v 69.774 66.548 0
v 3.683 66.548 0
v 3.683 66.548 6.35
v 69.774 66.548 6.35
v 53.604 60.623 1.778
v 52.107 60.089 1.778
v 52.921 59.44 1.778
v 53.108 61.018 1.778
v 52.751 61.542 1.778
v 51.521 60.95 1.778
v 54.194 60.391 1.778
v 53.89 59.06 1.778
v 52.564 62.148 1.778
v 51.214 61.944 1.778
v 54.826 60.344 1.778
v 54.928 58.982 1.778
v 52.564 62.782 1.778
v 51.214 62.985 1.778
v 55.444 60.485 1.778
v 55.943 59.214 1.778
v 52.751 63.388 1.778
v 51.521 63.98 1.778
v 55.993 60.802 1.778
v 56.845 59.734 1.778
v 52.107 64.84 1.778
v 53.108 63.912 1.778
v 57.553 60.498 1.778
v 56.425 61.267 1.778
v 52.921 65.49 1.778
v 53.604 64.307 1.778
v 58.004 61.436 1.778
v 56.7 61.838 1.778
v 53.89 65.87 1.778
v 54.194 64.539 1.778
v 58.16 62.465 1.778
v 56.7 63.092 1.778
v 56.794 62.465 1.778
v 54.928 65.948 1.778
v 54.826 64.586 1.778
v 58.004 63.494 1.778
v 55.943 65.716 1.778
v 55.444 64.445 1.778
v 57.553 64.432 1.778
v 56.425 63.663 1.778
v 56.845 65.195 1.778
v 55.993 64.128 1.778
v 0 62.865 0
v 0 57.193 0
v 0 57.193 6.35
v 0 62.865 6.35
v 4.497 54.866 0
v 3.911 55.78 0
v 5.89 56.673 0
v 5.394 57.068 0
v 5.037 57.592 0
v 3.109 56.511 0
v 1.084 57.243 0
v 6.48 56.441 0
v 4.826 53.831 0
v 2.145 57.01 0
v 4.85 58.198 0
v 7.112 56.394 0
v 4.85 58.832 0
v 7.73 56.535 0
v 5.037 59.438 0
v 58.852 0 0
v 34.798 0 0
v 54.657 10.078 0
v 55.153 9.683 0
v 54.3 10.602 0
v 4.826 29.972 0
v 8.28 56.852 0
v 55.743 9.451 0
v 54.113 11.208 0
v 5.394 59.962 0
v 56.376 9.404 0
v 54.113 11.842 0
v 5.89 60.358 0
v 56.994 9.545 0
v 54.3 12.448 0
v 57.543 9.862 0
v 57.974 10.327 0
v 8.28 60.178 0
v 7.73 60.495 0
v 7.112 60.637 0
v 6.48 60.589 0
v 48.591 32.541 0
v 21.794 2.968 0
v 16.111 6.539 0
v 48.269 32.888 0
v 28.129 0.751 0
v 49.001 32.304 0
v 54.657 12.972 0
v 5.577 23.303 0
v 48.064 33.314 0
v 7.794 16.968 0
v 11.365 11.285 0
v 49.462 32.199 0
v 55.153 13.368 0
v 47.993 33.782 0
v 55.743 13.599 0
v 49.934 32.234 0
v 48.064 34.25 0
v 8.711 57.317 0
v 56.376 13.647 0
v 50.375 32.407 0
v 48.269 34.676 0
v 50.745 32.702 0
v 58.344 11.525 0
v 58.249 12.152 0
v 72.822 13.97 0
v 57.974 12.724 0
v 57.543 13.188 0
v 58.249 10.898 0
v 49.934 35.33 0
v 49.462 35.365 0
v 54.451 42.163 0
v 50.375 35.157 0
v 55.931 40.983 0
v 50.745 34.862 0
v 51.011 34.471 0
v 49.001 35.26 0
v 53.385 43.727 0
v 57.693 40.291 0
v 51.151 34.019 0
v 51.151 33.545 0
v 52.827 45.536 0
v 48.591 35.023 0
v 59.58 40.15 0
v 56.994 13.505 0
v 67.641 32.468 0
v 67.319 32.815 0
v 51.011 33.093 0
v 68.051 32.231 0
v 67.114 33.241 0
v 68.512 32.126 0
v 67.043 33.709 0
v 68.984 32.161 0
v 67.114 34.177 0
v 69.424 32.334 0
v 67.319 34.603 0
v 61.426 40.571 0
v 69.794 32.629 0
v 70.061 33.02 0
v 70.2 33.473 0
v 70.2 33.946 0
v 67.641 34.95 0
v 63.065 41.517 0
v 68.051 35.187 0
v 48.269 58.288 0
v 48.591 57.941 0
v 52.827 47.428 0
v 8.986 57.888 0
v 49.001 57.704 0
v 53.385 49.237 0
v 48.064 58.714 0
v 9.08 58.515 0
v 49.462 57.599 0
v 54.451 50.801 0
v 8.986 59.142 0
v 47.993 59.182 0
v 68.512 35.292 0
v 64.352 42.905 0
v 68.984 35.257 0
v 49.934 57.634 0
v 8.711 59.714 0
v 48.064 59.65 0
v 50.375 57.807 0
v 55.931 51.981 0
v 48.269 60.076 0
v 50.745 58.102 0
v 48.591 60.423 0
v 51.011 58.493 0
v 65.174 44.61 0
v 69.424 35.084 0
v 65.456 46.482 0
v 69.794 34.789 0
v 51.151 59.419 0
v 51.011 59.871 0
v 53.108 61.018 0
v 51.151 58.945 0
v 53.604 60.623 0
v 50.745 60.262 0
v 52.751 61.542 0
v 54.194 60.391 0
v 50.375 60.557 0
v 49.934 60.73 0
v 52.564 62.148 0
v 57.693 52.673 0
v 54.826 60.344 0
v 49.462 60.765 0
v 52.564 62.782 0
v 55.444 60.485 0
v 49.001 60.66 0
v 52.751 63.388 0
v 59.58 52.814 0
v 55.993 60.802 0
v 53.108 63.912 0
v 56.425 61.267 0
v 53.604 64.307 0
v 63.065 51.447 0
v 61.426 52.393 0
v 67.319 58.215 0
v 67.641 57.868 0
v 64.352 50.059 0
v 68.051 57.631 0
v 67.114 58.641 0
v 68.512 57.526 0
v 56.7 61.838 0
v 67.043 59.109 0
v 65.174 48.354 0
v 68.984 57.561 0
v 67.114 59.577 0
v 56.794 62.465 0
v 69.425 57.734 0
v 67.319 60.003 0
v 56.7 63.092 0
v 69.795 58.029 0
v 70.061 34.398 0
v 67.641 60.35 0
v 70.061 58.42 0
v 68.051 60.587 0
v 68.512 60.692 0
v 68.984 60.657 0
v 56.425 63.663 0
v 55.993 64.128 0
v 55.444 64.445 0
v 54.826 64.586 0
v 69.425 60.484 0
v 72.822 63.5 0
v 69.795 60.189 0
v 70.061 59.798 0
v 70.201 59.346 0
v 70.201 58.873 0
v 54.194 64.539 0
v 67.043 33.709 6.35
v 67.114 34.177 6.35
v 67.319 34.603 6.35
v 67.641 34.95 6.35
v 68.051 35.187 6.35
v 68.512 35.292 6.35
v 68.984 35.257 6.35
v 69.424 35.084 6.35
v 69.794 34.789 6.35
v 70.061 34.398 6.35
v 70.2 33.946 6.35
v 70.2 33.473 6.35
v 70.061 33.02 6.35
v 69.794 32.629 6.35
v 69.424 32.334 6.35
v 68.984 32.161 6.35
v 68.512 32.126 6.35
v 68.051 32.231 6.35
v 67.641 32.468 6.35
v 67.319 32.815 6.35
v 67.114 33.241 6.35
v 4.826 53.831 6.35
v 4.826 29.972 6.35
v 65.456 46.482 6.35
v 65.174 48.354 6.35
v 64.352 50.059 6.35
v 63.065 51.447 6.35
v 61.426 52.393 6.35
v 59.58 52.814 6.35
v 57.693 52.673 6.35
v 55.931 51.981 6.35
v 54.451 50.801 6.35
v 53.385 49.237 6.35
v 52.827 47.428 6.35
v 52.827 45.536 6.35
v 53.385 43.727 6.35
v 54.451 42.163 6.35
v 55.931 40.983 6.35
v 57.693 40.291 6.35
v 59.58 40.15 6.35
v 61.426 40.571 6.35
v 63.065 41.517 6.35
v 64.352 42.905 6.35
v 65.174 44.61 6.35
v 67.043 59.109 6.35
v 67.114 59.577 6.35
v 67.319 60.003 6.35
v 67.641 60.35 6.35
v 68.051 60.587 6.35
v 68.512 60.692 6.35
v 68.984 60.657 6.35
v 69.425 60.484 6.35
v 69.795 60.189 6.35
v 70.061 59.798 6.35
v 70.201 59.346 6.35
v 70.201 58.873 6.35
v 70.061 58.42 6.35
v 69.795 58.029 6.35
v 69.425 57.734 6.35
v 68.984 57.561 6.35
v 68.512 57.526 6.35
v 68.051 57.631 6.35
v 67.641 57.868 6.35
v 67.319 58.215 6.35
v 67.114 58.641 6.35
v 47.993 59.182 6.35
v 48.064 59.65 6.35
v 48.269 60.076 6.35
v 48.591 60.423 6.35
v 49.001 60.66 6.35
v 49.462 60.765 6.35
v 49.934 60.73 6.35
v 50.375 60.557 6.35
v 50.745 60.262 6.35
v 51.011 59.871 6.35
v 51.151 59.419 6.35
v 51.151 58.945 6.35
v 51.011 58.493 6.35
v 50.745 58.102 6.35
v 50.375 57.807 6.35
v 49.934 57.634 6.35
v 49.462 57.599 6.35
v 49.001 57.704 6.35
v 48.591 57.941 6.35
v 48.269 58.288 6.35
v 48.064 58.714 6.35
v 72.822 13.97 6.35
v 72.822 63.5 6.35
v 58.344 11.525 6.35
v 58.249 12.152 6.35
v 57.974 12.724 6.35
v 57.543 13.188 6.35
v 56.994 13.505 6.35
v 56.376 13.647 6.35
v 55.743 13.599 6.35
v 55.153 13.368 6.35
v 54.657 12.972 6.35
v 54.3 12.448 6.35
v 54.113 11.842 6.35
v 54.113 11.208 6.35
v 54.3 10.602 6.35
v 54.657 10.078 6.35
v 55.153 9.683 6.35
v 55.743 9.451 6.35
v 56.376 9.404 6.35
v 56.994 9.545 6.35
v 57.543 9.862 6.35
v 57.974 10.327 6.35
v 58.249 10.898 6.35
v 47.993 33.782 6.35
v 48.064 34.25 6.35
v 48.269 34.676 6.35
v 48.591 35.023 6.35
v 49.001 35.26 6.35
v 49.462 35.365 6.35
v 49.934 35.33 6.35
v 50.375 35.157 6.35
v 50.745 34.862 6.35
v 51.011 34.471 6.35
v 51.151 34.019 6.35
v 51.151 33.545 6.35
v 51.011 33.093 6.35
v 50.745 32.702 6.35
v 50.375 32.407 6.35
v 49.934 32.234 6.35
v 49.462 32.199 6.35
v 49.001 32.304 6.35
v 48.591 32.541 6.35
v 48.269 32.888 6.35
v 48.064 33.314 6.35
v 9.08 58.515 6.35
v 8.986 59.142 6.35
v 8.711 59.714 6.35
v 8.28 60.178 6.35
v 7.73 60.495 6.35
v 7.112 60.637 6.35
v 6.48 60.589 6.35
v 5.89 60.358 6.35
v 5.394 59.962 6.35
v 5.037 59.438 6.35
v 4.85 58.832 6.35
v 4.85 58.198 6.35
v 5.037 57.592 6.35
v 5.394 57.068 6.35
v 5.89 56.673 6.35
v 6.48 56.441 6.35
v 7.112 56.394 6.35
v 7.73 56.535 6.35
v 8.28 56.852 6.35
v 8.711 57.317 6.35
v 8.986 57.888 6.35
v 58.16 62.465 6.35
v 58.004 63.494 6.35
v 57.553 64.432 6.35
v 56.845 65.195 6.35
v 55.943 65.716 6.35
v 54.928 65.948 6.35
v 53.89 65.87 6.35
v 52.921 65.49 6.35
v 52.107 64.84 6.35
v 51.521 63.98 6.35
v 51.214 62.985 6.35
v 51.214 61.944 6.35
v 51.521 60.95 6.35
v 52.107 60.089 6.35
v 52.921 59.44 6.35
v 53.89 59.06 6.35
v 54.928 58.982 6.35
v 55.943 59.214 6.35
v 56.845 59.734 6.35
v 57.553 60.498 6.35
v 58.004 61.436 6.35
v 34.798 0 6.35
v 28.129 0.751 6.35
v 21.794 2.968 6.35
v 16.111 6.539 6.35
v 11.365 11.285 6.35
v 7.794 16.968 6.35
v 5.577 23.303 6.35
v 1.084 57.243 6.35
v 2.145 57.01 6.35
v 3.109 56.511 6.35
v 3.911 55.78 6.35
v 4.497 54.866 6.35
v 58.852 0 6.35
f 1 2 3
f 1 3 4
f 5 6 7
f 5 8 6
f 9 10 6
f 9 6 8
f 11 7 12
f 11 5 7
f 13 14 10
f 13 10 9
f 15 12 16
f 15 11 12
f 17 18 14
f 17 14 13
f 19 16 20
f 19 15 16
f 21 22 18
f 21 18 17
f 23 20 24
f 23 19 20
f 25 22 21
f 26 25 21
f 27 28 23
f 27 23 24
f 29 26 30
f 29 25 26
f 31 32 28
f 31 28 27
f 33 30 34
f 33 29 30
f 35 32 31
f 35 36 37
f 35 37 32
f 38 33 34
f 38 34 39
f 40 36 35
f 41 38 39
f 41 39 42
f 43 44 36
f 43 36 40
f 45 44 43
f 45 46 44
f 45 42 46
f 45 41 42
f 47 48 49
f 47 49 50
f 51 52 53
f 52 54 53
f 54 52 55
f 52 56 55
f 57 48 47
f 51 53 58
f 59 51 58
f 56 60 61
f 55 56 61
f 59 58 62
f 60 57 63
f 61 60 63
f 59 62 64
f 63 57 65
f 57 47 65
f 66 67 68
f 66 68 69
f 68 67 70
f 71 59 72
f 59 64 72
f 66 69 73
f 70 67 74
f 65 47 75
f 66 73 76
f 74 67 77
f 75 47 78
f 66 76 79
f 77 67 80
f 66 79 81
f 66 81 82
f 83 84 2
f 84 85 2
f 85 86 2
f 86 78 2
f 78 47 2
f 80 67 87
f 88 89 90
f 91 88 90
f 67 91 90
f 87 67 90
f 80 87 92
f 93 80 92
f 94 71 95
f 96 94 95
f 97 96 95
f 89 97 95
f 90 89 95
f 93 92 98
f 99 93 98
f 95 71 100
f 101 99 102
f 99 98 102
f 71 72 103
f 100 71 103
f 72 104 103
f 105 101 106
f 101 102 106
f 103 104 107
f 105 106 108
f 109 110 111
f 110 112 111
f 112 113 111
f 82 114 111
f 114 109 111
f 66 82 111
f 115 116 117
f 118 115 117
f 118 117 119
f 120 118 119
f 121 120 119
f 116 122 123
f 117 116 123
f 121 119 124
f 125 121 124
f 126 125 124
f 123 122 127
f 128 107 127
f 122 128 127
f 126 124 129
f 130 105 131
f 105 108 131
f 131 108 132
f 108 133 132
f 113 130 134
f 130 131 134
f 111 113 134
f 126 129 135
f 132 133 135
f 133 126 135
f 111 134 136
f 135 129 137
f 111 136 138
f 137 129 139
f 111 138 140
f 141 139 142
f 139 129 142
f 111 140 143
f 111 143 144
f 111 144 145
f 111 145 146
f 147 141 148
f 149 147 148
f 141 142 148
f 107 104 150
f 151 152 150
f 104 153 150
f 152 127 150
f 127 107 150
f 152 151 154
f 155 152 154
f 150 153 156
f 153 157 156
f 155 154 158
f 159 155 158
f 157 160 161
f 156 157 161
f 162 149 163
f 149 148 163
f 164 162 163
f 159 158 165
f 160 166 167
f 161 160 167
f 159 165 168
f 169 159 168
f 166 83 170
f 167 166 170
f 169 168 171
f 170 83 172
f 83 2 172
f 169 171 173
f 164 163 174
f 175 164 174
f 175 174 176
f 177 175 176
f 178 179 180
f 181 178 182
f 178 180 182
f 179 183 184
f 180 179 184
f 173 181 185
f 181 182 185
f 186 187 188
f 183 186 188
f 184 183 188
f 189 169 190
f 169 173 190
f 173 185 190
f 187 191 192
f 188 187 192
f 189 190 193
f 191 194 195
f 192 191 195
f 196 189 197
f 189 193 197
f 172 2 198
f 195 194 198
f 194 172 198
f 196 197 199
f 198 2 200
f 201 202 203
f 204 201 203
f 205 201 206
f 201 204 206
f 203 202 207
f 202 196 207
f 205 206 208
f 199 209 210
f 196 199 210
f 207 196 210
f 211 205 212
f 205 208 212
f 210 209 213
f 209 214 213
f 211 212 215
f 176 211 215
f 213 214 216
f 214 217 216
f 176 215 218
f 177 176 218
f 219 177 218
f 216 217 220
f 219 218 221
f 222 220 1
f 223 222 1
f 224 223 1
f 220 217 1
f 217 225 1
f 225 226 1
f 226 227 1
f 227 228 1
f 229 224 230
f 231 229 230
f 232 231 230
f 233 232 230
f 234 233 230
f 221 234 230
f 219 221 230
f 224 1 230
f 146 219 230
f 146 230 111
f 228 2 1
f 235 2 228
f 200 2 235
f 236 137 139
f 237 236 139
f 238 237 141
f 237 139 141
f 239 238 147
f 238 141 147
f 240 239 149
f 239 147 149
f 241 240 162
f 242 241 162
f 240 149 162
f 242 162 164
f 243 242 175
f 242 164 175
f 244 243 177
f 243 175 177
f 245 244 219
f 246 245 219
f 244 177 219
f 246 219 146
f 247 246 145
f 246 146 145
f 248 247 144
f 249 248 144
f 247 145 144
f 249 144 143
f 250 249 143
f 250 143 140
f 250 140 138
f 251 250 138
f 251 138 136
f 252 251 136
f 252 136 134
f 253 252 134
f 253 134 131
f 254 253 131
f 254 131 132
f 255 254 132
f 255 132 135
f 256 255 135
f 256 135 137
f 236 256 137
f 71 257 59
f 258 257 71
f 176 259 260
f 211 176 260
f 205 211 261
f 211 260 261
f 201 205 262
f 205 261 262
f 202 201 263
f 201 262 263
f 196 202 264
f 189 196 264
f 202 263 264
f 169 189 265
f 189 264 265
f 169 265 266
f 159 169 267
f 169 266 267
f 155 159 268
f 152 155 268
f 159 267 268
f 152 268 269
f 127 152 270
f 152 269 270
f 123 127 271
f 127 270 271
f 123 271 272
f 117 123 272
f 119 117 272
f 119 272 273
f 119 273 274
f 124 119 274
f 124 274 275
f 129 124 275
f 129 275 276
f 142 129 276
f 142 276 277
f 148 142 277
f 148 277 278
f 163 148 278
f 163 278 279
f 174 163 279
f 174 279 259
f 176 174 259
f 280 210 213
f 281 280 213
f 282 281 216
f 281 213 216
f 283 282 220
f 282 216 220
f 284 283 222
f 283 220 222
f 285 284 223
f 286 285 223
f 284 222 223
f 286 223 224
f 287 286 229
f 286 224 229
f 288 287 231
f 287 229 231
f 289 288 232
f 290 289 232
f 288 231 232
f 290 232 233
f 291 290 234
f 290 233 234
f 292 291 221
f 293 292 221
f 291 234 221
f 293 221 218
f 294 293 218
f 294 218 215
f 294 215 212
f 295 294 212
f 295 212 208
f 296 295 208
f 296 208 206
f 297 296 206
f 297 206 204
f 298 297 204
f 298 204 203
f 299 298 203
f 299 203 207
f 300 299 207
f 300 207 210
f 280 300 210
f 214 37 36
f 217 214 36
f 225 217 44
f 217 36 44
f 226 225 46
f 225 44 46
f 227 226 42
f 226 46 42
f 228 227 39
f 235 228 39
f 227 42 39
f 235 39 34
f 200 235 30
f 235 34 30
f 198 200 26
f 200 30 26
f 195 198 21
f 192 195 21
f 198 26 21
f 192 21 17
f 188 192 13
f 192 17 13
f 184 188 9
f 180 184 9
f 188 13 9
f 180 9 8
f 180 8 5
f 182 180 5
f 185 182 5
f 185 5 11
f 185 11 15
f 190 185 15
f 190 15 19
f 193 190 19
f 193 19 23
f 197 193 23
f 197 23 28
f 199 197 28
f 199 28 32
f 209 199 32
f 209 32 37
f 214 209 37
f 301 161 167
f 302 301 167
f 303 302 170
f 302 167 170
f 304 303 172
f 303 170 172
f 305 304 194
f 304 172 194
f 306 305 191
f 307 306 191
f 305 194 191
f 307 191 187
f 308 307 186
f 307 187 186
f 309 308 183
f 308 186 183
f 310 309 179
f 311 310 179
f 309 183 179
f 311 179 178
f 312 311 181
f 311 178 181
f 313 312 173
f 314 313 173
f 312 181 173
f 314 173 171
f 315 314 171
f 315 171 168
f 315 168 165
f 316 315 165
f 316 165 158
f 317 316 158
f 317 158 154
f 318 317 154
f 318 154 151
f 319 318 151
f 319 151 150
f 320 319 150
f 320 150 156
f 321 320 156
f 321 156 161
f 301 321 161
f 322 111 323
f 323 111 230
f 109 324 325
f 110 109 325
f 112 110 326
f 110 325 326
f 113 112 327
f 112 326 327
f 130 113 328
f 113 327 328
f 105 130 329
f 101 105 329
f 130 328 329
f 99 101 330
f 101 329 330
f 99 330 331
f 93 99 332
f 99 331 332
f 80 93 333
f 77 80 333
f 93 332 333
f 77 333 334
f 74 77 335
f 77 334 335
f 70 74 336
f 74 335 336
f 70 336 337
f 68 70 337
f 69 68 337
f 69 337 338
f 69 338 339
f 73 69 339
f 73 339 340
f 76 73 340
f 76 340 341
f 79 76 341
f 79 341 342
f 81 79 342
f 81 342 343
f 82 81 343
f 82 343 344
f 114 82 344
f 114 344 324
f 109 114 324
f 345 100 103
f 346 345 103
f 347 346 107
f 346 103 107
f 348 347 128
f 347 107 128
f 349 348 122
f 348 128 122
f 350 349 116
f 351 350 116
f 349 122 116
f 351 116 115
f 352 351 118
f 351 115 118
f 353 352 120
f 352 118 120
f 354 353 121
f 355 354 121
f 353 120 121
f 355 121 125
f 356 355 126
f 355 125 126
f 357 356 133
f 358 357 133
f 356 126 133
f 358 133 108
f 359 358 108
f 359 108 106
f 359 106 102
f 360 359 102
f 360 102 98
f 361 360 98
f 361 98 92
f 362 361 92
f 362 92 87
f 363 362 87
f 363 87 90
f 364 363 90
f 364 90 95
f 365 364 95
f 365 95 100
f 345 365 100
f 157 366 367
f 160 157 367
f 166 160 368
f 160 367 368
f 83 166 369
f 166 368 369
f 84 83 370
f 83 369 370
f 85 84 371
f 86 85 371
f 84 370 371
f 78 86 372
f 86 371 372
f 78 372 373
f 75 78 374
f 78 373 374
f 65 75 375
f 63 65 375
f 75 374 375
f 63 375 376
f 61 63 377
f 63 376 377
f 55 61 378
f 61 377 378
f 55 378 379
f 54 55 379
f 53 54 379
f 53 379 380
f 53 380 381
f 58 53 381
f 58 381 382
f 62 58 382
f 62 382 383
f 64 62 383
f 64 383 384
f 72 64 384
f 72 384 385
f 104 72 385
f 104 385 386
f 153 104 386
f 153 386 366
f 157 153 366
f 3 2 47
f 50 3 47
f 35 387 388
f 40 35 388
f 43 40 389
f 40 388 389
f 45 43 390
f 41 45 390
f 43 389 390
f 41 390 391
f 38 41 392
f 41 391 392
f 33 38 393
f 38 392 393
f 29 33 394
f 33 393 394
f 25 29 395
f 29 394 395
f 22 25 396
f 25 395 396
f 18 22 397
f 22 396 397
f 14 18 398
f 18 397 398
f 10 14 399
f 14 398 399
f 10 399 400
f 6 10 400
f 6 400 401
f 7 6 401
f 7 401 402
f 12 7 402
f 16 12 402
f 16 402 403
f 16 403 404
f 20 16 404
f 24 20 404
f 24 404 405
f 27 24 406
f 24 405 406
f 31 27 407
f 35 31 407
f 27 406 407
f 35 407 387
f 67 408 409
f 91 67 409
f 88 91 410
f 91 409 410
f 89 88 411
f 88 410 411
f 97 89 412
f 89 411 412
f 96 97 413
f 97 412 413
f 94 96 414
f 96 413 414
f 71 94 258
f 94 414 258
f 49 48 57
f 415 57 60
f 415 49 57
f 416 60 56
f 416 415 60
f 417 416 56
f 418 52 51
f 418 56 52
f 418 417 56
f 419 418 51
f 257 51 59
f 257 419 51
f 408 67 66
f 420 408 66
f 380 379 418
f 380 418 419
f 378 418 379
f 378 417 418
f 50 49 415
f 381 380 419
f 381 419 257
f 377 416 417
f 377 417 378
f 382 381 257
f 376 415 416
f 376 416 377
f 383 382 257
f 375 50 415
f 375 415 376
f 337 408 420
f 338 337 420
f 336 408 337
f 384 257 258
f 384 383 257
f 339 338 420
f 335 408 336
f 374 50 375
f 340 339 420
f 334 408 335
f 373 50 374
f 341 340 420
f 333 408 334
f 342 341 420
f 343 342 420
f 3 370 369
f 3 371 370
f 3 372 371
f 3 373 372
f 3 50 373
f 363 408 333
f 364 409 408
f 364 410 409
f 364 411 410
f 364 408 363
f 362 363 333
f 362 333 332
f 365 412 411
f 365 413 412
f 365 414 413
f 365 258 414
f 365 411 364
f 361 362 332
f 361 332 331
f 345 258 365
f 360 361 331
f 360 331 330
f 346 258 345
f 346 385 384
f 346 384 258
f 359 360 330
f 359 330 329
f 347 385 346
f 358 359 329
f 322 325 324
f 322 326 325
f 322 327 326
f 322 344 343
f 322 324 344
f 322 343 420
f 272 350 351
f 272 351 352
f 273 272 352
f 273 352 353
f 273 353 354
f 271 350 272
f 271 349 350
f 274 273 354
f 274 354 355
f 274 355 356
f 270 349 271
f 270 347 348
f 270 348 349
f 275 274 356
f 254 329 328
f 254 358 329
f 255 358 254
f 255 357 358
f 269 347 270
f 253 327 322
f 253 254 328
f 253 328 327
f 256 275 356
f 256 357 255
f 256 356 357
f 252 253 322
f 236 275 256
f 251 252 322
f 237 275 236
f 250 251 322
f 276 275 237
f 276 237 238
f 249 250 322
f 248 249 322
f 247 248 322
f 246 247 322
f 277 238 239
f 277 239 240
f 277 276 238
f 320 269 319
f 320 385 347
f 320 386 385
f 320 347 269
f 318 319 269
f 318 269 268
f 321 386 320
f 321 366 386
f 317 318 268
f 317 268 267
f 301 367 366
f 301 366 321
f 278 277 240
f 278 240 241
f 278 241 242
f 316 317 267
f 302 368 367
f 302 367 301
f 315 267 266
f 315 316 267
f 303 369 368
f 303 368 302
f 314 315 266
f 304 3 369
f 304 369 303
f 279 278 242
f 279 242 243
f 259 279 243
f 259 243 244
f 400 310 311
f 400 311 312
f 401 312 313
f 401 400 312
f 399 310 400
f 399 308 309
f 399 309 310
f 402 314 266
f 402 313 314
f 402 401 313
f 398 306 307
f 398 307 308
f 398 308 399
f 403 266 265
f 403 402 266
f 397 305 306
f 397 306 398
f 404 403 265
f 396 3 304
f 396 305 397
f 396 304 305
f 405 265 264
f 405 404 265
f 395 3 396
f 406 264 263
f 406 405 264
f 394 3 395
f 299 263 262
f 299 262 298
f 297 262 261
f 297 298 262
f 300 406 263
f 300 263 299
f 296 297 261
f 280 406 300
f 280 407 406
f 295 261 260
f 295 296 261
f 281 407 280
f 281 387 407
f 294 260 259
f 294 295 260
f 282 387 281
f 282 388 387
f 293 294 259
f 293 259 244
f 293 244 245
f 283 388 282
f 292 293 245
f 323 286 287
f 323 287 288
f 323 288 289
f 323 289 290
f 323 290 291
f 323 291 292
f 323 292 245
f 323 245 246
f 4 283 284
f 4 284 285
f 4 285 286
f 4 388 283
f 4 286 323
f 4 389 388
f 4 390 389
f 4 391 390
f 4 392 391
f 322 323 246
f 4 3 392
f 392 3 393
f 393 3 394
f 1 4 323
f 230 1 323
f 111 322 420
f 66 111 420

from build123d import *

# Parameters (mm, degrees)
SKETCH1_W                        = 72.8218
SKETCH1_H                        = 66.548
BOSS_EXTRUDE1_DEPTH              = 6.35
SKETCH2_R                        = 6.35
CUT_EXTRUDE1_DEPTH               = 7.35
SKETCH3_R                        = 2.12725
CUT_EXTRUDE2_DEPTH               = 7.35
SKETCH4_R                        = 2.12725
CUT_EXTRUDE3_DEPTH               = 7.35
SKETCH5_R                        = 2.12725
CUT_EXTRUDE4_DEPTH               = 7.35
SKETCH6_R                        = 3.4925
CUT_EXTRUDE5_DEPTH               = 4.572
F_1_8_0_125_DIAMETER_HOLE1_D     = 3.175
F_1_8_0_125_DIAMETER_HOLE1_DEPTH = 25.4
F_1_8_0_125_DIAMETER_HOLE1_TIP   = 0.953866233
CUT_EXTRUDE6_DEPTH               = 7.35
CUT_EXTRUDE7_DEPTH               = 7.35
CUT_EXTRUDE8_DEPTH               = 7.35
CUT_EXTRUDE9_DEPTH               = 7.35
CUT_EXTRUDE10_DEPTH              = 7.35


with BuildPart() as part:
    # Sketch1 → Boss-Extrude1 (new body)
    with BuildSketch(Plane.XY):
        with Locations((36.4109, 33.274)):
            Rectangle(SKETCH1_W, SKETCH1_H)
    extrude(amount=BOSS_EXTRUDE1_DEPTH)

    # Sketch2 → Cut-Extrude1 (cut, through all)
    with BuildSketch(Plane.XY.offset(6.35)):
        with Locations((59.1058, 46.482)):
            Circle(SKETCH2_R)
    extrude(amount=-CUT_EXTRUDE1_DEPTH, mode=Mode.SUBTRACT)

    # Sketch3 → Cut-Extrude2 (cut, through all)
    with BuildSketch(Plane.XY.offset(6.35)):
        with Locations((56.21655, 11.52525)):
            Circle(SKETCH3_R)
    extrude(amount=-CUT_EXTRUDE2_DEPTH, mode=Mode.SUBTRACT)

    # Sketch4 → Cut-Extrude3 (cut, through all)
    with BuildSketch(Plane.XY.offset(6.35)):
        with Locations((6.95325, 58.51525)):
            Circle(SKETCH4_R)
    extrude(amount=-CUT_EXTRUDE3_DEPTH, mode=Mode.SUBTRACT)

    # Sketch5 → Cut-Extrude4 (cut, through all)
    with BuildSketch(Plane.XY.offset(6.35)):
        with Locations((54.66715, 62.46495)):
            Circle(SKETCH5_R)
    extrude(amount=-CUT_EXTRUDE4_DEPTH, mode=Mode.SUBTRACT)

    # Sketch6 → Cut-Extrude5 (cut)
    with BuildSketch(Plane.XY.offset(6.35)):
        with Locations((54.66715, 62.46495)):
            Circle(SKETCH6_R)
    extrude(amount=-CUT_EXTRUDE5_DEPTH, mode=Mode.SUBTRACT)

    # 1/8 (0.125) Diameter Hole1
    with Locations(Plane.XY.offset(6.35)):
        with Locations((49.5808, 59.182), (68.6308, 59.109110049), (68.630660552, 33.70911005), (49.5808, 33.782)):
            Hole(F_1_8_0_125_DIAMETER_HOLE1_D / 2, depth=F_1_8_0_125_DIAMETER_HOLE1_DEPTH)
            with Locations((0, 0, -(F_1_8_0_125_DIAMETER_HOLE1_DEPTH + F_1_8_0_125_DIAMETER_HOLE1_TIP / 2))):  # 118° drill point
                Cone(0, F_1_8_0_125_DIAMETER_HOLE1_D / 2, F_1_8_0_125_DIAMETER_HOLE1_TIP, mode=Mode.SUBTRACT)

    # Sketch9 → Cut-Extrude6 (cut, through all)
    with BuildSketch(Plane.XY.offset(6.35)):
        Polygon((72.8218, 13.97), (58.8518, 0), (72.8218, 0), align=None)
    extrude(amount=-CUT_EXTRUDE6_DEPTH, mode=Mode.SUBTRACT)

    # Sketch10 → Cut-Extrude7 (cut, through all)
    with BuildSketch(Plane.XY.offset(6.35)):
        Polygon((3.683, 66.548), (0, 62.865), (0, 66.548), align=None)
    extrude(amount=-CUT_EXTRUDE7_DEPTH, mode=Mode.SUBTRACT)

    # Sketch11 → Cut-Extrude8 (cut, through all)
    with BuildSketch(Plane.XY.offset(6.35)):
        with BuildLine():
            Line((4.826, 53.831043168), (4.826, 0))
            Line((4.826, 0), (0, 0))
            Line((0, 0), (0, 57.192541634))
            ThreePointArc((0, 57.192541634), (3.109189127, 56.511289727), (4.826, 53.831043168))
        make_face()
    extrude(amount=-CUT_EXTRUDE8_DEPTH, mode=Mode.SUBTRACT)

    # Sketch12 → Cut-Extrude9 (cut, through all)
    with BuildSketch(Plane.XY.offset(6.35)):
        with BuildLine():
            Line((4.826, 29.972), (4.826, 0))
            Line((4.826, 0), (34.798, 0))
            ThreePointArc((34.798, 0), (13.604595554, 8.778595554), (4.826, 29.972))
        make_face()
    extrude(amount=-CUT_EXTRUDE9_DEPTH, mode=Mode.SUBTRACT)

    # Sketch13 → Cut-Extrude10 (cut, through all)
    with BuildSketch(Plane.XY.offset(6.35)):
        Polygon((69.7738, 66.548), (72.8218, 63.5), (72.8218, 66.548), align=None)
    extrude(amount=-CUT_EXTRUDE10_DEPTH, mode=Mode.SUBTRACT)


solid = part.part
